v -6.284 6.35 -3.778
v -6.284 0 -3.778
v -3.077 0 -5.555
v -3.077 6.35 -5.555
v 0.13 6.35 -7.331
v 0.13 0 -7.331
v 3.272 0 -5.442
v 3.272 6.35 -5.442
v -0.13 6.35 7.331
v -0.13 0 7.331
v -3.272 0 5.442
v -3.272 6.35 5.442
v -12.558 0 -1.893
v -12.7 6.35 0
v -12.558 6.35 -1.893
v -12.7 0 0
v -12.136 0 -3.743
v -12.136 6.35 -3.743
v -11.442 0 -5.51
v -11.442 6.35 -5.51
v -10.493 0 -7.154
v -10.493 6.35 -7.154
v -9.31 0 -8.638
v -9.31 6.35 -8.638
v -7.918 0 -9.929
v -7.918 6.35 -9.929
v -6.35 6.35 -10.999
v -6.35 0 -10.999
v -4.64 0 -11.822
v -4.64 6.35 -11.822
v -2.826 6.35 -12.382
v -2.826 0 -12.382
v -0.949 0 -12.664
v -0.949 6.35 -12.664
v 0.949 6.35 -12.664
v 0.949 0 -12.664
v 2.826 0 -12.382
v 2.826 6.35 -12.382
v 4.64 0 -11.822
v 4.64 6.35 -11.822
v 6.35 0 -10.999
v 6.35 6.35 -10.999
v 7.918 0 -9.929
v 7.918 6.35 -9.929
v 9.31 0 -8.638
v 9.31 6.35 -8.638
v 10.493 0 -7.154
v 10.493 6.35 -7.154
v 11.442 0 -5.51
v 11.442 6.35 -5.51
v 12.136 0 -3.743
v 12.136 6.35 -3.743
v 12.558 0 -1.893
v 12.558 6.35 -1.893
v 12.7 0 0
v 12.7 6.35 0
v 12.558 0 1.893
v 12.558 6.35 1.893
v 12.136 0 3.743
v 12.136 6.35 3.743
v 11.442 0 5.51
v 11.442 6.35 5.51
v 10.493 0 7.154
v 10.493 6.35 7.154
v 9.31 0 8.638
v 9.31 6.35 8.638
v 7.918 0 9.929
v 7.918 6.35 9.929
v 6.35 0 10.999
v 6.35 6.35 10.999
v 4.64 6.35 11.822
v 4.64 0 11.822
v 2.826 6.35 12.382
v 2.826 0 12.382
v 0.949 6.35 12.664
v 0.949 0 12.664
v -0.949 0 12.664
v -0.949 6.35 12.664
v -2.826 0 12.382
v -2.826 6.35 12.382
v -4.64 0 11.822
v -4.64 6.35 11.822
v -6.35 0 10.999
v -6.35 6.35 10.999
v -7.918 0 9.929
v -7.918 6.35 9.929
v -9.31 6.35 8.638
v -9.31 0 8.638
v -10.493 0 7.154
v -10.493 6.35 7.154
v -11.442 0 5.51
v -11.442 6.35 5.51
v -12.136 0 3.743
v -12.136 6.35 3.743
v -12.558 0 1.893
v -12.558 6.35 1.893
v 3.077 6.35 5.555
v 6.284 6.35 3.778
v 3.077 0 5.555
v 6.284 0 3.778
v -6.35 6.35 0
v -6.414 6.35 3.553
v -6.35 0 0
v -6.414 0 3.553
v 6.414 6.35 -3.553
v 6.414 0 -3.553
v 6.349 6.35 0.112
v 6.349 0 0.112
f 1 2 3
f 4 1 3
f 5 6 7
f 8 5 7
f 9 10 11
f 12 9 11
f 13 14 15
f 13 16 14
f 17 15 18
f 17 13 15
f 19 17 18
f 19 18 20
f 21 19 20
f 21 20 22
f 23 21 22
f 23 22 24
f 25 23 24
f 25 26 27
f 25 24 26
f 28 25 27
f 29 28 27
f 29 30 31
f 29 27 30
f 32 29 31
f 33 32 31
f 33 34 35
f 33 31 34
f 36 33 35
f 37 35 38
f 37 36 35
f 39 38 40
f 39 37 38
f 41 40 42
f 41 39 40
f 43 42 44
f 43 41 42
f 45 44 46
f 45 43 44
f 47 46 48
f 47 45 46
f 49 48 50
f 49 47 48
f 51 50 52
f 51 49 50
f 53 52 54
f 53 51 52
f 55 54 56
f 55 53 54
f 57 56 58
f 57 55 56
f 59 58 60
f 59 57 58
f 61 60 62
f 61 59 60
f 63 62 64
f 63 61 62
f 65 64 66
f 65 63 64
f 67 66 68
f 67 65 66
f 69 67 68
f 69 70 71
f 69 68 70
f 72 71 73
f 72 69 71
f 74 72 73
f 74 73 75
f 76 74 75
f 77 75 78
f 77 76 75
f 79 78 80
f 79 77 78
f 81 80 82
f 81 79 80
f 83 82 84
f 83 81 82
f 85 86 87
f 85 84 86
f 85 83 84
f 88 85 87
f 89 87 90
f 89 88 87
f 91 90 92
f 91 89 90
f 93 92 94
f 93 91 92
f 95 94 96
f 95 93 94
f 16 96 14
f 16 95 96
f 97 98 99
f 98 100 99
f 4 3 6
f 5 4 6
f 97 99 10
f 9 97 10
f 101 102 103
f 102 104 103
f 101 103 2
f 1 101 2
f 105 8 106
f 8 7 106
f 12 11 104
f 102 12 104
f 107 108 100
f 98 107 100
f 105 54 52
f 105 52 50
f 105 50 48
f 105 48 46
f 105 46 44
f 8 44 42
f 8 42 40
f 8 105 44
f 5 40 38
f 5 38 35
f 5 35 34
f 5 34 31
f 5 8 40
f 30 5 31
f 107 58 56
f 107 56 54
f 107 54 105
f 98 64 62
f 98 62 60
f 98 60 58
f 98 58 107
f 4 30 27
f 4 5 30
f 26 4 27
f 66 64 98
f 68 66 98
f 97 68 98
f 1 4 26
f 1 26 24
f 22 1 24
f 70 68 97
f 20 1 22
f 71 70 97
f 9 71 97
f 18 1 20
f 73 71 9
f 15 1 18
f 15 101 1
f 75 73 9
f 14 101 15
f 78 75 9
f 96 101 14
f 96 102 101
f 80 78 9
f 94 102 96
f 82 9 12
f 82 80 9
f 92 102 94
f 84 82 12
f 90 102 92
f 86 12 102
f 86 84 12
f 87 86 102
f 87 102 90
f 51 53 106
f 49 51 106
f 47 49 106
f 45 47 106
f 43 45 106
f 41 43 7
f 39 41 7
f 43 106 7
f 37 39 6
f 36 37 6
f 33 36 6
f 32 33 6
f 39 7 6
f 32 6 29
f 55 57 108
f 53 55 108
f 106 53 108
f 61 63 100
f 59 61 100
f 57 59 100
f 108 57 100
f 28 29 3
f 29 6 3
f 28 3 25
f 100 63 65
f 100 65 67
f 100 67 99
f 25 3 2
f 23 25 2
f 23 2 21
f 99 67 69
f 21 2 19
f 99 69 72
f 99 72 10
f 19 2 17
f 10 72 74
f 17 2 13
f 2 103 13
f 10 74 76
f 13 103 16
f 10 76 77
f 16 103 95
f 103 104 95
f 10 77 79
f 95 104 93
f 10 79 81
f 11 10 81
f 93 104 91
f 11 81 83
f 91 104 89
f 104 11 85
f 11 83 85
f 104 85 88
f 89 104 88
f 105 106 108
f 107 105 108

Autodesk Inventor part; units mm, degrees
ref_plane "YZ Plane" through (0, 0, 0) normal (1, 0, 0) x (0, 1, 0)
ref_plane "XZ Plane" through (0, 0, 0) normal (0, 1, 0) x (-1, 0, 0)
ref_plane "XY Plane" through (0, 0, 0) normal (0, 0, 1) x (1, 0, 0)
sketch "Sketch1" plane through (0, 0, 0) normal (0, 1, 0) x (-1, 0, 0)
  circle A0 centre (0, 0) radius 6.35
  line L0 (-0.1298, -7.3312) -> (-6.4139, -3.5532)
  line L1 (-6.4139, -3.5532) -> (-6.2841, 3.778)
  line L2 (-6.2841, 3.778) -> (0.1298, 7.3312)
  line L3 (0.1298, 7.3312) -> (6.4139, 3.5532)
  line L4 (6.4139, 3.5532) -> (6.2841, -3.778)
  line L5 (6.2841, -3.778) -> (-0.1298, -7.3312)
  circle A1 centre (0, 0) radius 12.7
  point P0 (3.0772, -5.5546)
  dimension "d0" = 12.7
  dimension "d1" = 25.4
extrude "Extrusion1" add sketch "Sketch1" along normal blind 6.35
properties part number "4-bar intake spacer"
